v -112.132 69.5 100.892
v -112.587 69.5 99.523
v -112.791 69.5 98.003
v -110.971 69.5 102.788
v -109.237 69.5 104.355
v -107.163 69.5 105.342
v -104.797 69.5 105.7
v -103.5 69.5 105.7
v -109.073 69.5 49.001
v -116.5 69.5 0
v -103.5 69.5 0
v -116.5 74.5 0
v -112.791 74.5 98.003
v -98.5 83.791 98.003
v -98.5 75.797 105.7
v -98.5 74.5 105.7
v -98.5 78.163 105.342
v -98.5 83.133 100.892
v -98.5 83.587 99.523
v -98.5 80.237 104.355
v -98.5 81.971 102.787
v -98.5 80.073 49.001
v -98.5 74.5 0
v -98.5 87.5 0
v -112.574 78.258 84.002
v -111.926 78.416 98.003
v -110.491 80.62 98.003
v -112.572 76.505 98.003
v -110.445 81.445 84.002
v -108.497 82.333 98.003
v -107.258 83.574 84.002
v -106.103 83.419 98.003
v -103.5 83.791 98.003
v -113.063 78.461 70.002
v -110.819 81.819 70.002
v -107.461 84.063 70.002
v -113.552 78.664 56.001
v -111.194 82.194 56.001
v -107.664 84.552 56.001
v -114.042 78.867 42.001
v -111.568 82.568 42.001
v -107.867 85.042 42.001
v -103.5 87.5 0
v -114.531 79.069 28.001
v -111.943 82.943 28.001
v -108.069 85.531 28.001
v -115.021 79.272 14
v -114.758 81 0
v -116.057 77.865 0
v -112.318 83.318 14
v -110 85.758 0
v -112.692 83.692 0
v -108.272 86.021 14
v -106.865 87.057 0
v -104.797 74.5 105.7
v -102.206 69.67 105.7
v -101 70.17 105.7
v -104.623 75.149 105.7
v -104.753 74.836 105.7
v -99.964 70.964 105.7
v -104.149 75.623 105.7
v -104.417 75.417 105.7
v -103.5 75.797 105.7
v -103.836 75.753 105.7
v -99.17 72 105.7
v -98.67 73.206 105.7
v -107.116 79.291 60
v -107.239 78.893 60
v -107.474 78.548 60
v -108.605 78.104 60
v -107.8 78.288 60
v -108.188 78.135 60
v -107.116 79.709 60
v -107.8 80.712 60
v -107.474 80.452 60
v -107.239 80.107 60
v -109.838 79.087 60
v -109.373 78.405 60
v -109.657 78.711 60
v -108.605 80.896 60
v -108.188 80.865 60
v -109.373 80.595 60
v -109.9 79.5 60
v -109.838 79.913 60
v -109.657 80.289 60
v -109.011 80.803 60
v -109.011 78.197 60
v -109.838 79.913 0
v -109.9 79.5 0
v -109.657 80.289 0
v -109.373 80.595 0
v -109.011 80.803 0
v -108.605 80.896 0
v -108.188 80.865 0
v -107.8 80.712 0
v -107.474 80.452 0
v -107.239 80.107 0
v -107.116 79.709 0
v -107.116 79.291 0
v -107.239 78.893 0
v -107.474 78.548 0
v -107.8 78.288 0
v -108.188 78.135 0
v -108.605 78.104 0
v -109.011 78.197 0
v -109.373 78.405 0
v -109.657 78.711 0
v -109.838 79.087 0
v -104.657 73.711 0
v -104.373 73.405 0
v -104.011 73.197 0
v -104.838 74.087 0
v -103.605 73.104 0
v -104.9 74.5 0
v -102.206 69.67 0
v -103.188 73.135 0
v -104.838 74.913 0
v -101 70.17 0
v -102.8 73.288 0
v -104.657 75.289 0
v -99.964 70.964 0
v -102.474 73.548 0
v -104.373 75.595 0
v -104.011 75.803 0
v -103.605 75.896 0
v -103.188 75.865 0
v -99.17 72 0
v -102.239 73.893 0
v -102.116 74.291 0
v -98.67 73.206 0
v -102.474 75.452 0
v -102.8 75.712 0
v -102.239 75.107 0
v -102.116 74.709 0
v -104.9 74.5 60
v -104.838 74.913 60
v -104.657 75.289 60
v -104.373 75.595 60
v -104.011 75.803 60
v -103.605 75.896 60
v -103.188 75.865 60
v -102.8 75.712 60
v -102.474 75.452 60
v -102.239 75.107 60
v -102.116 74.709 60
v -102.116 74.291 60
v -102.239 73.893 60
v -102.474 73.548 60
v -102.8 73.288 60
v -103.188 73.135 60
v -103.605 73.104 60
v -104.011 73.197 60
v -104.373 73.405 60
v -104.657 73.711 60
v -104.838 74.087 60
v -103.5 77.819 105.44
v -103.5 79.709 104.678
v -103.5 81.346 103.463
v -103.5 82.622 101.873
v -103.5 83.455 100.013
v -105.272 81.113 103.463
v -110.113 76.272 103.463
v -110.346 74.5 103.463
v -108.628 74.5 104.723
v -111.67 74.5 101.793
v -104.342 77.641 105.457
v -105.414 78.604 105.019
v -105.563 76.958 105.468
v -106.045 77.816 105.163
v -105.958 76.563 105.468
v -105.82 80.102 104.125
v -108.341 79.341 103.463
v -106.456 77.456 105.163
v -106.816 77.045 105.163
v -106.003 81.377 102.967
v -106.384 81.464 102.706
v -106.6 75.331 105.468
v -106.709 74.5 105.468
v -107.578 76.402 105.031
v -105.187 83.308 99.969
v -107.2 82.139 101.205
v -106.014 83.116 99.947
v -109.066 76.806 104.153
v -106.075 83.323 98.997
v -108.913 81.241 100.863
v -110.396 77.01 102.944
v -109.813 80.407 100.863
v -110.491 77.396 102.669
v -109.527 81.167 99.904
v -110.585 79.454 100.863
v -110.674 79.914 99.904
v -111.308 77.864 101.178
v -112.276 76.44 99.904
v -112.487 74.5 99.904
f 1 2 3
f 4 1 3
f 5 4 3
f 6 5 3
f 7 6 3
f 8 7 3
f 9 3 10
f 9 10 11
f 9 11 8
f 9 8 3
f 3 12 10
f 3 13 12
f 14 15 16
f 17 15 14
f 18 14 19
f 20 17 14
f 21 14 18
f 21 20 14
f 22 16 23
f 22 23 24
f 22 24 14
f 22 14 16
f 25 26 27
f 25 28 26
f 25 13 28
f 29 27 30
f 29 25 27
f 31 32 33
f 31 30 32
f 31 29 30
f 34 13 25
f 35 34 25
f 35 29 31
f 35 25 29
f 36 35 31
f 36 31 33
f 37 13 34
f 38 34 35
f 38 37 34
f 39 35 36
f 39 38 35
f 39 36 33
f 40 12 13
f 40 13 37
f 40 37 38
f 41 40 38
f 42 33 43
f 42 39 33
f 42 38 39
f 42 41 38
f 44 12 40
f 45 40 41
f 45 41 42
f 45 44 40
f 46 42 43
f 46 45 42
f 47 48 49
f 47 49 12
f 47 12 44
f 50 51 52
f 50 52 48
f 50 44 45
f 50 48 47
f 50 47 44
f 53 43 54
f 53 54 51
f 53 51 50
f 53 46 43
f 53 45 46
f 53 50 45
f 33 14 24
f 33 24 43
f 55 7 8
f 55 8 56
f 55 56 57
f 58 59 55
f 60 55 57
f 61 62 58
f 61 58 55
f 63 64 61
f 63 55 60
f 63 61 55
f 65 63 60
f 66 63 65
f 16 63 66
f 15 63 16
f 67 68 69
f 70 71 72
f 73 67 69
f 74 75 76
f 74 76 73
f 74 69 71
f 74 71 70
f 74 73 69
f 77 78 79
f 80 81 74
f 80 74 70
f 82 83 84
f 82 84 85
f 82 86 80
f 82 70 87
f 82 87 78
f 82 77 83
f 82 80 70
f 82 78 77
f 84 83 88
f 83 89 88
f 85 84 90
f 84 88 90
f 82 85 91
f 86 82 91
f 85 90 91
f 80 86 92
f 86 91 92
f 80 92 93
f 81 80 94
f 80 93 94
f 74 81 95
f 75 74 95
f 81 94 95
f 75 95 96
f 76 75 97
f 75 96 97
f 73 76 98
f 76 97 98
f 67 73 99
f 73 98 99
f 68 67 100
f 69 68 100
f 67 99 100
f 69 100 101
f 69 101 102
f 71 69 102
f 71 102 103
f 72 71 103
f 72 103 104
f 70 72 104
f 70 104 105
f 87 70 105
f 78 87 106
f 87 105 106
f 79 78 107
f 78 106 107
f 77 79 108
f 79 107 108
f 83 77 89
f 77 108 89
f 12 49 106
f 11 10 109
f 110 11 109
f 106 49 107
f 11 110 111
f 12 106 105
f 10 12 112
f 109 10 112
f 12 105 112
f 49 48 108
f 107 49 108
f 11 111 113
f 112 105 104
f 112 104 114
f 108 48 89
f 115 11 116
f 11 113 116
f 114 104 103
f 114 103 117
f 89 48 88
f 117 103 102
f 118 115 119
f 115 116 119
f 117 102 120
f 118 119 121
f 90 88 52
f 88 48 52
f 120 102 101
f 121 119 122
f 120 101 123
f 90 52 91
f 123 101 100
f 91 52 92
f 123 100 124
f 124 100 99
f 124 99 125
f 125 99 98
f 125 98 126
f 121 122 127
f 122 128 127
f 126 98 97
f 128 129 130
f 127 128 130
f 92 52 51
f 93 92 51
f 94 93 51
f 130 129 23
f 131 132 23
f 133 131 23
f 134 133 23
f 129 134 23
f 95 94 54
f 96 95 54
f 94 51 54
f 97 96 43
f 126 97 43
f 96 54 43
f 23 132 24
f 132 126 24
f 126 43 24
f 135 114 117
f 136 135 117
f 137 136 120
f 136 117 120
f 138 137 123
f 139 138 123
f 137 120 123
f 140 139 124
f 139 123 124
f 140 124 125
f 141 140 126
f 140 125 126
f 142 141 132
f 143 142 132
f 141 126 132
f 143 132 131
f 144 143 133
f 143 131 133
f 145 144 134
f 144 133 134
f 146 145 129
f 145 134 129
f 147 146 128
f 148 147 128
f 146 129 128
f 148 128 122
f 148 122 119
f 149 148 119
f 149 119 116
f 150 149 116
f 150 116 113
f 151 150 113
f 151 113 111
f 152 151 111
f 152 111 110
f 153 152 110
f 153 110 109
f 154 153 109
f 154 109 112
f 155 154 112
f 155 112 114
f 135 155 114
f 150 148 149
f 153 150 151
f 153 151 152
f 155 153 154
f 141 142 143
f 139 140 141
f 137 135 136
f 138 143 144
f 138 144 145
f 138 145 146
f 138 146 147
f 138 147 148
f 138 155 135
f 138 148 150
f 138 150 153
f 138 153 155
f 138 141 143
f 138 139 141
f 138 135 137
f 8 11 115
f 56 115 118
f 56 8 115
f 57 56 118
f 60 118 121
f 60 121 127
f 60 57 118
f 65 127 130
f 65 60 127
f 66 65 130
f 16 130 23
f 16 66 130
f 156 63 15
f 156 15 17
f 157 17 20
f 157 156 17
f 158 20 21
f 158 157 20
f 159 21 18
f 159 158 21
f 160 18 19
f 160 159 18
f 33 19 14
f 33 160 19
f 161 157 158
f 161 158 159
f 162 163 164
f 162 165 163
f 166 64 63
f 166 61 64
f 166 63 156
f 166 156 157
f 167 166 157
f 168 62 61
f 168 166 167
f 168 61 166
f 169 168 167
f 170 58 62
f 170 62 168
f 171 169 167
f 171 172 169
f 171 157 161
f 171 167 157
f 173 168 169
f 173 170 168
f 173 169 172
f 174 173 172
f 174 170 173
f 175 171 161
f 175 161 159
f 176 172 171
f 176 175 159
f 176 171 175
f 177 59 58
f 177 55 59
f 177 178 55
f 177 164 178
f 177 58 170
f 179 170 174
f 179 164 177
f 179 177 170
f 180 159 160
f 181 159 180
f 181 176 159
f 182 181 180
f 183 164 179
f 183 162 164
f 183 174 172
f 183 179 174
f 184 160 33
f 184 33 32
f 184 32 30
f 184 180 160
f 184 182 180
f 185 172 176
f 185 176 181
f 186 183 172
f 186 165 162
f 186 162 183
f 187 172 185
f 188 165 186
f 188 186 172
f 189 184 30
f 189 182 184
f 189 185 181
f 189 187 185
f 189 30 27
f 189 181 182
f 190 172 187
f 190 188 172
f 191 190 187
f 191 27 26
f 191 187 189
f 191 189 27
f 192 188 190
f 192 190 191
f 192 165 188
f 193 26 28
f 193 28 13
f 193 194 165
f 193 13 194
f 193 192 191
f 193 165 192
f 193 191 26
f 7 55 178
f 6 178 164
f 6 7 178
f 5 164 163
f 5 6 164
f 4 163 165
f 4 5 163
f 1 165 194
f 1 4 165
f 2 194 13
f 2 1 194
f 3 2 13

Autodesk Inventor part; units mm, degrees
ref_plane "YZ Plane" through (0, 0, 0) normal (1, 0, 0) x (0, 1, 0)
ref_plane "XZ Plane" through (0, 0, 0) normal (0, 1, 0) x (-1, 0, 0)
ref_plane "XY Plane" through (0, 0, 0) normal (0, 0, 1) x (1, 0, 0)
ref_plane "Arbeitsebene1" through (0, 0, 0) normal (0, 0, 1) x (1, 0, 0)
sketch "Skizze1" plane through (0, 0, 0) normal (0, 0, 1) x (1, 0, 0)
  line L0 (76.5043, -50) -> (76.5043, 50) projected
  arc A0 (96.5043, 50) -> (76.5043, 50) centre (86.5043, 50) ccw projected
  line L1 (96.5043, 50) -> (96.5043, -50) projected
  arc A1 (76.5043, -50) -> (96.5043, -50) centre (86.5043, -50) ccw projected
  line L2 (-95.8131, -50) -> (-95.8131, 50) projected
  arc A2 (-75.8131, 50) -> (-95.8131, 50) centre (-85.8131, 50) ccw projected
  line L3 (-75.8131, 50) -> (-75.8131, -50) projected
  arc A3 (-95.8131, -50) -> (-75.8131, -50) centre (-85.8131, -50) ccw projected
  line L4 (-118.5, -74.5) -> (-118.5, 74.5) projected
  arc A4 (-118.5, -74.5) -> (-103.5, -89.5) centre (-103.5, -74.5) ccw projected
  line L5 (56.1, -89.5) -> (-103.5, -89.5) projected
  line L6 (56.1, -83) -> (56.1, -89.5) projected
  arc A5 (71.1, -68) -> (56.1, -83) centre (71.1, -83) ccw projected
  line L7 (80.5, -68) -> (71.1, -68) projected
  arc A6 (95.5, -83) -> (80.5, -68) centre (80.5, -83) ccw projected
  line L8 (95.5, -89.5) -> (95.5, -83) projected
  line L9 (103.5, -89.5) -> (95.5, -89.5) projected
  arc A7 (103.5, -89.5) -> (118.5, -74.5) centre (103.5, -74.5) ccw projected
  line L10 (118.5, 74.5) -> (118.5, -74.5) projected
  arc A8 (118.5, 74.5) -> (103.5, 89.5) centre (103.5, 74.5) ccw projected
  line L11 (-103.5, 89.5) -> (103.5, 89.5) projected
  arc A9 (-103.5, 89.5) -> (-118.5, 74.5) centre (-103.5, 74.5) ccw projected
  circle A10 centre (-58.5, 18.7) radius 1.4 projected
  circle A11 centre (-58.5, 36.552) radius 1.4 projected
  circle A12 centre (57.5, 20.252) radius 1.4 projected
  circle A13 centre (57.5, 35) radius 1.4 projected
  circle A14 centre (-58.5, 8.7) radius 1.4 projected
  circle A15 centre (-58.5, -9.152) radius 1.4 projected
  circle A16 centre (57.5, 7.148) radius 1.4 projected
  circle A17 centre (57.5, -7.6) radius 1.4 projected
  circle A18 centre (103.5, 74.5) radius 1.4 projected
  circle A19 centre (103.5, -74.5) radius 1.4 projected
  circle A20 centre (-103.5, -74.5) radius 1.4 projected
  circle A21 centre (-103.5, 74.5) radius 1.4 projected
  line L12 (20.9567, 0.5738) -> (-20.9567, 0.5738) projected
  line L13 (-20.9567, 0.5738) -> (-20.9567, 30.6837) projected
  line L14 (-20.9567, 30.6837) -> (20.9567, 30.6837) projected
  line L15 (20.9567, 30.6837) -> (20.9567, 0.5738) projected
  circle A22 centre (73.1917, -22.4328) radius 1.4 projected
  circle A23 centre (43.1917, -22.4328) radius 1.4 projected
  circle A24 centre (13.1917, -22.4328) radius 1.4 projected
  circle A25 centre (-16.8083, -22.4328) radius 1.4 projected
  circle A26 centre (-46.8083, -22.4328) radius 1.4 projected
  circle A27 centre (-102.338, -1.3) radius 1.4 projected
  circle A28 centre (-102.338, 13.7) radius 1.4 projected
  circle A29 centre (-102.338, 28.7) radius 1.4 projected
  circle A30 centre (102.338, 28.7) radius 1.4 projected
  circle A31 centre (-73.1917, -22.4328) radius 1.4 projected
  circle A32 centre (-43.1917, -22.4328) radius 1.4 projected
  circle A33 centre (-13.1917, -22.4328) radius 1.4 projected
  circle A34 centre (16.8083, -22.4328) radius 1.4 projected
  circle A35 centre (46.8083, -22.4328) radius 1.4 projected
  circle A36 centre (102.338, -1.3) radius 1.4 projected
  circle A37 centre (102.338, 13.7) radius 1.4 projected
  circle A38 centre (-103.5, 74.5) radius 5
  line L16 (-116.5, 74.5) -> (-116.5, -74.5)
  arc A39 (-116.5, -74.5) -> (-103.5, -87.5) centre (-103.5, -74.5) ccw
  line L17 (-103.5, -87.5) -> (54.1, -87.5)
  line L18 (54.1, -87.5) -> (54.1, -83)
  arc A40 (71.1, -66) -> (54.1, -83) centre (71.1, -83) ccw
  line L19 (71.1, -66) -> (80.5, -66)
  arc A41 (97.5, -83) -> (80.5, -66) centre (80.5, -83) ccw
  line L20 (97.5, -83) -> (97.5, -87.5)
  line L21 (97.5, -87.5) -> (103.5, -87.5)
  arc A42 (103.5, -87.5) -> (116.5, -74.5) centre (103.5, -74.5) ccw
  line L22 (116.5, -74.5) -> (116.5, 74.5)
  arc A43 (116.5, 74.5) -> (103.5, 87.5) centre (103.5, 74.5) ccw
  line L23 (103.5, 87.5) -> (-103.5, 87.5)
  arc A44 (-103.5, 87.5) -> (-116.5, 74.5) centre (-103.5, 74.5) ccw
  line L24 (-98.5, 74.5) -> (-98.5, 87.5)
  line L25 (-103.5, 69.5) -> (-116.5, 69.5)
  circle A45 centre (-108.5, 79.5) radius 1.4 projected
  circle A46 centre (-108.5, -79.5) radius 1.4 projected
  circle A47 centre (108.5, 79.5) radius 1.4 projected
  circle A48 centre (108.5, -79.5) radius 1.4 projected
  point P0 (0, 0)
  dimension "d0" = 10
  dimension "d1" = 2
ref_plane "Arbeitsebene2" through (0, 0, 105.7) normal (0, 0, 1) x (1, 0, 0)
sketch "Skizze4" plane through (0, 0, 105.7) normal (0, 0, 1) x (1, 0, 0)
  line L0 (-98.5, 74.5) -> (-98.5, 87.5) projected
  circle A0 centre (-103.5, 74.5) radius 5 projected
  line L1 (-103.5, 69.5) -> (-116.5, 69.5) projected
  arc A1 (-103.5, 87.5) -> (-116.5, 74.5) centre (-103.5, 74.5) ccw projected
  arc A2 (-103.5, 83.5) -> (-112.5, 74.5) centre (-103.5, 74.5) ccw
  line L2 (-103.5, 83.5) -> (-98.5, 83.5)
  line L3 (-112.5, 74.5) -> (-112.5, 69.5)
  point P0 (0, 0)
  dimension "d8" = 4
loft "Erhebung1" add profiles "Skizze1", "Skizze4" contours A21 | A38 | A38 L25 L16 A44 L23 L24 | A45 / all
sketch "Skizze5" plane through (-103.5, 69.5, 0) normal (0, 0, -1) x (-1, 0, 0)
  circle A0 centre (0, 5) radius 3.25 projected
  circle A1 centre (0, 5) radius 1.4 projected
  circle A2 centre (5, 10) radius 1.4 projected
  point P0 (-103.5, -69.5)
extrude "Extrusion4" cut sketch "Skizze5" against normal blind 60 contours A1 | A2
fillet "Rundung1" radius 8 3 edges at (-109.864, 80.864, 105.7) (-101, 83.5, 105.7) (-112.5, 72, 105.7)
properties part number "60_Planktoscope_CornerPillars"
